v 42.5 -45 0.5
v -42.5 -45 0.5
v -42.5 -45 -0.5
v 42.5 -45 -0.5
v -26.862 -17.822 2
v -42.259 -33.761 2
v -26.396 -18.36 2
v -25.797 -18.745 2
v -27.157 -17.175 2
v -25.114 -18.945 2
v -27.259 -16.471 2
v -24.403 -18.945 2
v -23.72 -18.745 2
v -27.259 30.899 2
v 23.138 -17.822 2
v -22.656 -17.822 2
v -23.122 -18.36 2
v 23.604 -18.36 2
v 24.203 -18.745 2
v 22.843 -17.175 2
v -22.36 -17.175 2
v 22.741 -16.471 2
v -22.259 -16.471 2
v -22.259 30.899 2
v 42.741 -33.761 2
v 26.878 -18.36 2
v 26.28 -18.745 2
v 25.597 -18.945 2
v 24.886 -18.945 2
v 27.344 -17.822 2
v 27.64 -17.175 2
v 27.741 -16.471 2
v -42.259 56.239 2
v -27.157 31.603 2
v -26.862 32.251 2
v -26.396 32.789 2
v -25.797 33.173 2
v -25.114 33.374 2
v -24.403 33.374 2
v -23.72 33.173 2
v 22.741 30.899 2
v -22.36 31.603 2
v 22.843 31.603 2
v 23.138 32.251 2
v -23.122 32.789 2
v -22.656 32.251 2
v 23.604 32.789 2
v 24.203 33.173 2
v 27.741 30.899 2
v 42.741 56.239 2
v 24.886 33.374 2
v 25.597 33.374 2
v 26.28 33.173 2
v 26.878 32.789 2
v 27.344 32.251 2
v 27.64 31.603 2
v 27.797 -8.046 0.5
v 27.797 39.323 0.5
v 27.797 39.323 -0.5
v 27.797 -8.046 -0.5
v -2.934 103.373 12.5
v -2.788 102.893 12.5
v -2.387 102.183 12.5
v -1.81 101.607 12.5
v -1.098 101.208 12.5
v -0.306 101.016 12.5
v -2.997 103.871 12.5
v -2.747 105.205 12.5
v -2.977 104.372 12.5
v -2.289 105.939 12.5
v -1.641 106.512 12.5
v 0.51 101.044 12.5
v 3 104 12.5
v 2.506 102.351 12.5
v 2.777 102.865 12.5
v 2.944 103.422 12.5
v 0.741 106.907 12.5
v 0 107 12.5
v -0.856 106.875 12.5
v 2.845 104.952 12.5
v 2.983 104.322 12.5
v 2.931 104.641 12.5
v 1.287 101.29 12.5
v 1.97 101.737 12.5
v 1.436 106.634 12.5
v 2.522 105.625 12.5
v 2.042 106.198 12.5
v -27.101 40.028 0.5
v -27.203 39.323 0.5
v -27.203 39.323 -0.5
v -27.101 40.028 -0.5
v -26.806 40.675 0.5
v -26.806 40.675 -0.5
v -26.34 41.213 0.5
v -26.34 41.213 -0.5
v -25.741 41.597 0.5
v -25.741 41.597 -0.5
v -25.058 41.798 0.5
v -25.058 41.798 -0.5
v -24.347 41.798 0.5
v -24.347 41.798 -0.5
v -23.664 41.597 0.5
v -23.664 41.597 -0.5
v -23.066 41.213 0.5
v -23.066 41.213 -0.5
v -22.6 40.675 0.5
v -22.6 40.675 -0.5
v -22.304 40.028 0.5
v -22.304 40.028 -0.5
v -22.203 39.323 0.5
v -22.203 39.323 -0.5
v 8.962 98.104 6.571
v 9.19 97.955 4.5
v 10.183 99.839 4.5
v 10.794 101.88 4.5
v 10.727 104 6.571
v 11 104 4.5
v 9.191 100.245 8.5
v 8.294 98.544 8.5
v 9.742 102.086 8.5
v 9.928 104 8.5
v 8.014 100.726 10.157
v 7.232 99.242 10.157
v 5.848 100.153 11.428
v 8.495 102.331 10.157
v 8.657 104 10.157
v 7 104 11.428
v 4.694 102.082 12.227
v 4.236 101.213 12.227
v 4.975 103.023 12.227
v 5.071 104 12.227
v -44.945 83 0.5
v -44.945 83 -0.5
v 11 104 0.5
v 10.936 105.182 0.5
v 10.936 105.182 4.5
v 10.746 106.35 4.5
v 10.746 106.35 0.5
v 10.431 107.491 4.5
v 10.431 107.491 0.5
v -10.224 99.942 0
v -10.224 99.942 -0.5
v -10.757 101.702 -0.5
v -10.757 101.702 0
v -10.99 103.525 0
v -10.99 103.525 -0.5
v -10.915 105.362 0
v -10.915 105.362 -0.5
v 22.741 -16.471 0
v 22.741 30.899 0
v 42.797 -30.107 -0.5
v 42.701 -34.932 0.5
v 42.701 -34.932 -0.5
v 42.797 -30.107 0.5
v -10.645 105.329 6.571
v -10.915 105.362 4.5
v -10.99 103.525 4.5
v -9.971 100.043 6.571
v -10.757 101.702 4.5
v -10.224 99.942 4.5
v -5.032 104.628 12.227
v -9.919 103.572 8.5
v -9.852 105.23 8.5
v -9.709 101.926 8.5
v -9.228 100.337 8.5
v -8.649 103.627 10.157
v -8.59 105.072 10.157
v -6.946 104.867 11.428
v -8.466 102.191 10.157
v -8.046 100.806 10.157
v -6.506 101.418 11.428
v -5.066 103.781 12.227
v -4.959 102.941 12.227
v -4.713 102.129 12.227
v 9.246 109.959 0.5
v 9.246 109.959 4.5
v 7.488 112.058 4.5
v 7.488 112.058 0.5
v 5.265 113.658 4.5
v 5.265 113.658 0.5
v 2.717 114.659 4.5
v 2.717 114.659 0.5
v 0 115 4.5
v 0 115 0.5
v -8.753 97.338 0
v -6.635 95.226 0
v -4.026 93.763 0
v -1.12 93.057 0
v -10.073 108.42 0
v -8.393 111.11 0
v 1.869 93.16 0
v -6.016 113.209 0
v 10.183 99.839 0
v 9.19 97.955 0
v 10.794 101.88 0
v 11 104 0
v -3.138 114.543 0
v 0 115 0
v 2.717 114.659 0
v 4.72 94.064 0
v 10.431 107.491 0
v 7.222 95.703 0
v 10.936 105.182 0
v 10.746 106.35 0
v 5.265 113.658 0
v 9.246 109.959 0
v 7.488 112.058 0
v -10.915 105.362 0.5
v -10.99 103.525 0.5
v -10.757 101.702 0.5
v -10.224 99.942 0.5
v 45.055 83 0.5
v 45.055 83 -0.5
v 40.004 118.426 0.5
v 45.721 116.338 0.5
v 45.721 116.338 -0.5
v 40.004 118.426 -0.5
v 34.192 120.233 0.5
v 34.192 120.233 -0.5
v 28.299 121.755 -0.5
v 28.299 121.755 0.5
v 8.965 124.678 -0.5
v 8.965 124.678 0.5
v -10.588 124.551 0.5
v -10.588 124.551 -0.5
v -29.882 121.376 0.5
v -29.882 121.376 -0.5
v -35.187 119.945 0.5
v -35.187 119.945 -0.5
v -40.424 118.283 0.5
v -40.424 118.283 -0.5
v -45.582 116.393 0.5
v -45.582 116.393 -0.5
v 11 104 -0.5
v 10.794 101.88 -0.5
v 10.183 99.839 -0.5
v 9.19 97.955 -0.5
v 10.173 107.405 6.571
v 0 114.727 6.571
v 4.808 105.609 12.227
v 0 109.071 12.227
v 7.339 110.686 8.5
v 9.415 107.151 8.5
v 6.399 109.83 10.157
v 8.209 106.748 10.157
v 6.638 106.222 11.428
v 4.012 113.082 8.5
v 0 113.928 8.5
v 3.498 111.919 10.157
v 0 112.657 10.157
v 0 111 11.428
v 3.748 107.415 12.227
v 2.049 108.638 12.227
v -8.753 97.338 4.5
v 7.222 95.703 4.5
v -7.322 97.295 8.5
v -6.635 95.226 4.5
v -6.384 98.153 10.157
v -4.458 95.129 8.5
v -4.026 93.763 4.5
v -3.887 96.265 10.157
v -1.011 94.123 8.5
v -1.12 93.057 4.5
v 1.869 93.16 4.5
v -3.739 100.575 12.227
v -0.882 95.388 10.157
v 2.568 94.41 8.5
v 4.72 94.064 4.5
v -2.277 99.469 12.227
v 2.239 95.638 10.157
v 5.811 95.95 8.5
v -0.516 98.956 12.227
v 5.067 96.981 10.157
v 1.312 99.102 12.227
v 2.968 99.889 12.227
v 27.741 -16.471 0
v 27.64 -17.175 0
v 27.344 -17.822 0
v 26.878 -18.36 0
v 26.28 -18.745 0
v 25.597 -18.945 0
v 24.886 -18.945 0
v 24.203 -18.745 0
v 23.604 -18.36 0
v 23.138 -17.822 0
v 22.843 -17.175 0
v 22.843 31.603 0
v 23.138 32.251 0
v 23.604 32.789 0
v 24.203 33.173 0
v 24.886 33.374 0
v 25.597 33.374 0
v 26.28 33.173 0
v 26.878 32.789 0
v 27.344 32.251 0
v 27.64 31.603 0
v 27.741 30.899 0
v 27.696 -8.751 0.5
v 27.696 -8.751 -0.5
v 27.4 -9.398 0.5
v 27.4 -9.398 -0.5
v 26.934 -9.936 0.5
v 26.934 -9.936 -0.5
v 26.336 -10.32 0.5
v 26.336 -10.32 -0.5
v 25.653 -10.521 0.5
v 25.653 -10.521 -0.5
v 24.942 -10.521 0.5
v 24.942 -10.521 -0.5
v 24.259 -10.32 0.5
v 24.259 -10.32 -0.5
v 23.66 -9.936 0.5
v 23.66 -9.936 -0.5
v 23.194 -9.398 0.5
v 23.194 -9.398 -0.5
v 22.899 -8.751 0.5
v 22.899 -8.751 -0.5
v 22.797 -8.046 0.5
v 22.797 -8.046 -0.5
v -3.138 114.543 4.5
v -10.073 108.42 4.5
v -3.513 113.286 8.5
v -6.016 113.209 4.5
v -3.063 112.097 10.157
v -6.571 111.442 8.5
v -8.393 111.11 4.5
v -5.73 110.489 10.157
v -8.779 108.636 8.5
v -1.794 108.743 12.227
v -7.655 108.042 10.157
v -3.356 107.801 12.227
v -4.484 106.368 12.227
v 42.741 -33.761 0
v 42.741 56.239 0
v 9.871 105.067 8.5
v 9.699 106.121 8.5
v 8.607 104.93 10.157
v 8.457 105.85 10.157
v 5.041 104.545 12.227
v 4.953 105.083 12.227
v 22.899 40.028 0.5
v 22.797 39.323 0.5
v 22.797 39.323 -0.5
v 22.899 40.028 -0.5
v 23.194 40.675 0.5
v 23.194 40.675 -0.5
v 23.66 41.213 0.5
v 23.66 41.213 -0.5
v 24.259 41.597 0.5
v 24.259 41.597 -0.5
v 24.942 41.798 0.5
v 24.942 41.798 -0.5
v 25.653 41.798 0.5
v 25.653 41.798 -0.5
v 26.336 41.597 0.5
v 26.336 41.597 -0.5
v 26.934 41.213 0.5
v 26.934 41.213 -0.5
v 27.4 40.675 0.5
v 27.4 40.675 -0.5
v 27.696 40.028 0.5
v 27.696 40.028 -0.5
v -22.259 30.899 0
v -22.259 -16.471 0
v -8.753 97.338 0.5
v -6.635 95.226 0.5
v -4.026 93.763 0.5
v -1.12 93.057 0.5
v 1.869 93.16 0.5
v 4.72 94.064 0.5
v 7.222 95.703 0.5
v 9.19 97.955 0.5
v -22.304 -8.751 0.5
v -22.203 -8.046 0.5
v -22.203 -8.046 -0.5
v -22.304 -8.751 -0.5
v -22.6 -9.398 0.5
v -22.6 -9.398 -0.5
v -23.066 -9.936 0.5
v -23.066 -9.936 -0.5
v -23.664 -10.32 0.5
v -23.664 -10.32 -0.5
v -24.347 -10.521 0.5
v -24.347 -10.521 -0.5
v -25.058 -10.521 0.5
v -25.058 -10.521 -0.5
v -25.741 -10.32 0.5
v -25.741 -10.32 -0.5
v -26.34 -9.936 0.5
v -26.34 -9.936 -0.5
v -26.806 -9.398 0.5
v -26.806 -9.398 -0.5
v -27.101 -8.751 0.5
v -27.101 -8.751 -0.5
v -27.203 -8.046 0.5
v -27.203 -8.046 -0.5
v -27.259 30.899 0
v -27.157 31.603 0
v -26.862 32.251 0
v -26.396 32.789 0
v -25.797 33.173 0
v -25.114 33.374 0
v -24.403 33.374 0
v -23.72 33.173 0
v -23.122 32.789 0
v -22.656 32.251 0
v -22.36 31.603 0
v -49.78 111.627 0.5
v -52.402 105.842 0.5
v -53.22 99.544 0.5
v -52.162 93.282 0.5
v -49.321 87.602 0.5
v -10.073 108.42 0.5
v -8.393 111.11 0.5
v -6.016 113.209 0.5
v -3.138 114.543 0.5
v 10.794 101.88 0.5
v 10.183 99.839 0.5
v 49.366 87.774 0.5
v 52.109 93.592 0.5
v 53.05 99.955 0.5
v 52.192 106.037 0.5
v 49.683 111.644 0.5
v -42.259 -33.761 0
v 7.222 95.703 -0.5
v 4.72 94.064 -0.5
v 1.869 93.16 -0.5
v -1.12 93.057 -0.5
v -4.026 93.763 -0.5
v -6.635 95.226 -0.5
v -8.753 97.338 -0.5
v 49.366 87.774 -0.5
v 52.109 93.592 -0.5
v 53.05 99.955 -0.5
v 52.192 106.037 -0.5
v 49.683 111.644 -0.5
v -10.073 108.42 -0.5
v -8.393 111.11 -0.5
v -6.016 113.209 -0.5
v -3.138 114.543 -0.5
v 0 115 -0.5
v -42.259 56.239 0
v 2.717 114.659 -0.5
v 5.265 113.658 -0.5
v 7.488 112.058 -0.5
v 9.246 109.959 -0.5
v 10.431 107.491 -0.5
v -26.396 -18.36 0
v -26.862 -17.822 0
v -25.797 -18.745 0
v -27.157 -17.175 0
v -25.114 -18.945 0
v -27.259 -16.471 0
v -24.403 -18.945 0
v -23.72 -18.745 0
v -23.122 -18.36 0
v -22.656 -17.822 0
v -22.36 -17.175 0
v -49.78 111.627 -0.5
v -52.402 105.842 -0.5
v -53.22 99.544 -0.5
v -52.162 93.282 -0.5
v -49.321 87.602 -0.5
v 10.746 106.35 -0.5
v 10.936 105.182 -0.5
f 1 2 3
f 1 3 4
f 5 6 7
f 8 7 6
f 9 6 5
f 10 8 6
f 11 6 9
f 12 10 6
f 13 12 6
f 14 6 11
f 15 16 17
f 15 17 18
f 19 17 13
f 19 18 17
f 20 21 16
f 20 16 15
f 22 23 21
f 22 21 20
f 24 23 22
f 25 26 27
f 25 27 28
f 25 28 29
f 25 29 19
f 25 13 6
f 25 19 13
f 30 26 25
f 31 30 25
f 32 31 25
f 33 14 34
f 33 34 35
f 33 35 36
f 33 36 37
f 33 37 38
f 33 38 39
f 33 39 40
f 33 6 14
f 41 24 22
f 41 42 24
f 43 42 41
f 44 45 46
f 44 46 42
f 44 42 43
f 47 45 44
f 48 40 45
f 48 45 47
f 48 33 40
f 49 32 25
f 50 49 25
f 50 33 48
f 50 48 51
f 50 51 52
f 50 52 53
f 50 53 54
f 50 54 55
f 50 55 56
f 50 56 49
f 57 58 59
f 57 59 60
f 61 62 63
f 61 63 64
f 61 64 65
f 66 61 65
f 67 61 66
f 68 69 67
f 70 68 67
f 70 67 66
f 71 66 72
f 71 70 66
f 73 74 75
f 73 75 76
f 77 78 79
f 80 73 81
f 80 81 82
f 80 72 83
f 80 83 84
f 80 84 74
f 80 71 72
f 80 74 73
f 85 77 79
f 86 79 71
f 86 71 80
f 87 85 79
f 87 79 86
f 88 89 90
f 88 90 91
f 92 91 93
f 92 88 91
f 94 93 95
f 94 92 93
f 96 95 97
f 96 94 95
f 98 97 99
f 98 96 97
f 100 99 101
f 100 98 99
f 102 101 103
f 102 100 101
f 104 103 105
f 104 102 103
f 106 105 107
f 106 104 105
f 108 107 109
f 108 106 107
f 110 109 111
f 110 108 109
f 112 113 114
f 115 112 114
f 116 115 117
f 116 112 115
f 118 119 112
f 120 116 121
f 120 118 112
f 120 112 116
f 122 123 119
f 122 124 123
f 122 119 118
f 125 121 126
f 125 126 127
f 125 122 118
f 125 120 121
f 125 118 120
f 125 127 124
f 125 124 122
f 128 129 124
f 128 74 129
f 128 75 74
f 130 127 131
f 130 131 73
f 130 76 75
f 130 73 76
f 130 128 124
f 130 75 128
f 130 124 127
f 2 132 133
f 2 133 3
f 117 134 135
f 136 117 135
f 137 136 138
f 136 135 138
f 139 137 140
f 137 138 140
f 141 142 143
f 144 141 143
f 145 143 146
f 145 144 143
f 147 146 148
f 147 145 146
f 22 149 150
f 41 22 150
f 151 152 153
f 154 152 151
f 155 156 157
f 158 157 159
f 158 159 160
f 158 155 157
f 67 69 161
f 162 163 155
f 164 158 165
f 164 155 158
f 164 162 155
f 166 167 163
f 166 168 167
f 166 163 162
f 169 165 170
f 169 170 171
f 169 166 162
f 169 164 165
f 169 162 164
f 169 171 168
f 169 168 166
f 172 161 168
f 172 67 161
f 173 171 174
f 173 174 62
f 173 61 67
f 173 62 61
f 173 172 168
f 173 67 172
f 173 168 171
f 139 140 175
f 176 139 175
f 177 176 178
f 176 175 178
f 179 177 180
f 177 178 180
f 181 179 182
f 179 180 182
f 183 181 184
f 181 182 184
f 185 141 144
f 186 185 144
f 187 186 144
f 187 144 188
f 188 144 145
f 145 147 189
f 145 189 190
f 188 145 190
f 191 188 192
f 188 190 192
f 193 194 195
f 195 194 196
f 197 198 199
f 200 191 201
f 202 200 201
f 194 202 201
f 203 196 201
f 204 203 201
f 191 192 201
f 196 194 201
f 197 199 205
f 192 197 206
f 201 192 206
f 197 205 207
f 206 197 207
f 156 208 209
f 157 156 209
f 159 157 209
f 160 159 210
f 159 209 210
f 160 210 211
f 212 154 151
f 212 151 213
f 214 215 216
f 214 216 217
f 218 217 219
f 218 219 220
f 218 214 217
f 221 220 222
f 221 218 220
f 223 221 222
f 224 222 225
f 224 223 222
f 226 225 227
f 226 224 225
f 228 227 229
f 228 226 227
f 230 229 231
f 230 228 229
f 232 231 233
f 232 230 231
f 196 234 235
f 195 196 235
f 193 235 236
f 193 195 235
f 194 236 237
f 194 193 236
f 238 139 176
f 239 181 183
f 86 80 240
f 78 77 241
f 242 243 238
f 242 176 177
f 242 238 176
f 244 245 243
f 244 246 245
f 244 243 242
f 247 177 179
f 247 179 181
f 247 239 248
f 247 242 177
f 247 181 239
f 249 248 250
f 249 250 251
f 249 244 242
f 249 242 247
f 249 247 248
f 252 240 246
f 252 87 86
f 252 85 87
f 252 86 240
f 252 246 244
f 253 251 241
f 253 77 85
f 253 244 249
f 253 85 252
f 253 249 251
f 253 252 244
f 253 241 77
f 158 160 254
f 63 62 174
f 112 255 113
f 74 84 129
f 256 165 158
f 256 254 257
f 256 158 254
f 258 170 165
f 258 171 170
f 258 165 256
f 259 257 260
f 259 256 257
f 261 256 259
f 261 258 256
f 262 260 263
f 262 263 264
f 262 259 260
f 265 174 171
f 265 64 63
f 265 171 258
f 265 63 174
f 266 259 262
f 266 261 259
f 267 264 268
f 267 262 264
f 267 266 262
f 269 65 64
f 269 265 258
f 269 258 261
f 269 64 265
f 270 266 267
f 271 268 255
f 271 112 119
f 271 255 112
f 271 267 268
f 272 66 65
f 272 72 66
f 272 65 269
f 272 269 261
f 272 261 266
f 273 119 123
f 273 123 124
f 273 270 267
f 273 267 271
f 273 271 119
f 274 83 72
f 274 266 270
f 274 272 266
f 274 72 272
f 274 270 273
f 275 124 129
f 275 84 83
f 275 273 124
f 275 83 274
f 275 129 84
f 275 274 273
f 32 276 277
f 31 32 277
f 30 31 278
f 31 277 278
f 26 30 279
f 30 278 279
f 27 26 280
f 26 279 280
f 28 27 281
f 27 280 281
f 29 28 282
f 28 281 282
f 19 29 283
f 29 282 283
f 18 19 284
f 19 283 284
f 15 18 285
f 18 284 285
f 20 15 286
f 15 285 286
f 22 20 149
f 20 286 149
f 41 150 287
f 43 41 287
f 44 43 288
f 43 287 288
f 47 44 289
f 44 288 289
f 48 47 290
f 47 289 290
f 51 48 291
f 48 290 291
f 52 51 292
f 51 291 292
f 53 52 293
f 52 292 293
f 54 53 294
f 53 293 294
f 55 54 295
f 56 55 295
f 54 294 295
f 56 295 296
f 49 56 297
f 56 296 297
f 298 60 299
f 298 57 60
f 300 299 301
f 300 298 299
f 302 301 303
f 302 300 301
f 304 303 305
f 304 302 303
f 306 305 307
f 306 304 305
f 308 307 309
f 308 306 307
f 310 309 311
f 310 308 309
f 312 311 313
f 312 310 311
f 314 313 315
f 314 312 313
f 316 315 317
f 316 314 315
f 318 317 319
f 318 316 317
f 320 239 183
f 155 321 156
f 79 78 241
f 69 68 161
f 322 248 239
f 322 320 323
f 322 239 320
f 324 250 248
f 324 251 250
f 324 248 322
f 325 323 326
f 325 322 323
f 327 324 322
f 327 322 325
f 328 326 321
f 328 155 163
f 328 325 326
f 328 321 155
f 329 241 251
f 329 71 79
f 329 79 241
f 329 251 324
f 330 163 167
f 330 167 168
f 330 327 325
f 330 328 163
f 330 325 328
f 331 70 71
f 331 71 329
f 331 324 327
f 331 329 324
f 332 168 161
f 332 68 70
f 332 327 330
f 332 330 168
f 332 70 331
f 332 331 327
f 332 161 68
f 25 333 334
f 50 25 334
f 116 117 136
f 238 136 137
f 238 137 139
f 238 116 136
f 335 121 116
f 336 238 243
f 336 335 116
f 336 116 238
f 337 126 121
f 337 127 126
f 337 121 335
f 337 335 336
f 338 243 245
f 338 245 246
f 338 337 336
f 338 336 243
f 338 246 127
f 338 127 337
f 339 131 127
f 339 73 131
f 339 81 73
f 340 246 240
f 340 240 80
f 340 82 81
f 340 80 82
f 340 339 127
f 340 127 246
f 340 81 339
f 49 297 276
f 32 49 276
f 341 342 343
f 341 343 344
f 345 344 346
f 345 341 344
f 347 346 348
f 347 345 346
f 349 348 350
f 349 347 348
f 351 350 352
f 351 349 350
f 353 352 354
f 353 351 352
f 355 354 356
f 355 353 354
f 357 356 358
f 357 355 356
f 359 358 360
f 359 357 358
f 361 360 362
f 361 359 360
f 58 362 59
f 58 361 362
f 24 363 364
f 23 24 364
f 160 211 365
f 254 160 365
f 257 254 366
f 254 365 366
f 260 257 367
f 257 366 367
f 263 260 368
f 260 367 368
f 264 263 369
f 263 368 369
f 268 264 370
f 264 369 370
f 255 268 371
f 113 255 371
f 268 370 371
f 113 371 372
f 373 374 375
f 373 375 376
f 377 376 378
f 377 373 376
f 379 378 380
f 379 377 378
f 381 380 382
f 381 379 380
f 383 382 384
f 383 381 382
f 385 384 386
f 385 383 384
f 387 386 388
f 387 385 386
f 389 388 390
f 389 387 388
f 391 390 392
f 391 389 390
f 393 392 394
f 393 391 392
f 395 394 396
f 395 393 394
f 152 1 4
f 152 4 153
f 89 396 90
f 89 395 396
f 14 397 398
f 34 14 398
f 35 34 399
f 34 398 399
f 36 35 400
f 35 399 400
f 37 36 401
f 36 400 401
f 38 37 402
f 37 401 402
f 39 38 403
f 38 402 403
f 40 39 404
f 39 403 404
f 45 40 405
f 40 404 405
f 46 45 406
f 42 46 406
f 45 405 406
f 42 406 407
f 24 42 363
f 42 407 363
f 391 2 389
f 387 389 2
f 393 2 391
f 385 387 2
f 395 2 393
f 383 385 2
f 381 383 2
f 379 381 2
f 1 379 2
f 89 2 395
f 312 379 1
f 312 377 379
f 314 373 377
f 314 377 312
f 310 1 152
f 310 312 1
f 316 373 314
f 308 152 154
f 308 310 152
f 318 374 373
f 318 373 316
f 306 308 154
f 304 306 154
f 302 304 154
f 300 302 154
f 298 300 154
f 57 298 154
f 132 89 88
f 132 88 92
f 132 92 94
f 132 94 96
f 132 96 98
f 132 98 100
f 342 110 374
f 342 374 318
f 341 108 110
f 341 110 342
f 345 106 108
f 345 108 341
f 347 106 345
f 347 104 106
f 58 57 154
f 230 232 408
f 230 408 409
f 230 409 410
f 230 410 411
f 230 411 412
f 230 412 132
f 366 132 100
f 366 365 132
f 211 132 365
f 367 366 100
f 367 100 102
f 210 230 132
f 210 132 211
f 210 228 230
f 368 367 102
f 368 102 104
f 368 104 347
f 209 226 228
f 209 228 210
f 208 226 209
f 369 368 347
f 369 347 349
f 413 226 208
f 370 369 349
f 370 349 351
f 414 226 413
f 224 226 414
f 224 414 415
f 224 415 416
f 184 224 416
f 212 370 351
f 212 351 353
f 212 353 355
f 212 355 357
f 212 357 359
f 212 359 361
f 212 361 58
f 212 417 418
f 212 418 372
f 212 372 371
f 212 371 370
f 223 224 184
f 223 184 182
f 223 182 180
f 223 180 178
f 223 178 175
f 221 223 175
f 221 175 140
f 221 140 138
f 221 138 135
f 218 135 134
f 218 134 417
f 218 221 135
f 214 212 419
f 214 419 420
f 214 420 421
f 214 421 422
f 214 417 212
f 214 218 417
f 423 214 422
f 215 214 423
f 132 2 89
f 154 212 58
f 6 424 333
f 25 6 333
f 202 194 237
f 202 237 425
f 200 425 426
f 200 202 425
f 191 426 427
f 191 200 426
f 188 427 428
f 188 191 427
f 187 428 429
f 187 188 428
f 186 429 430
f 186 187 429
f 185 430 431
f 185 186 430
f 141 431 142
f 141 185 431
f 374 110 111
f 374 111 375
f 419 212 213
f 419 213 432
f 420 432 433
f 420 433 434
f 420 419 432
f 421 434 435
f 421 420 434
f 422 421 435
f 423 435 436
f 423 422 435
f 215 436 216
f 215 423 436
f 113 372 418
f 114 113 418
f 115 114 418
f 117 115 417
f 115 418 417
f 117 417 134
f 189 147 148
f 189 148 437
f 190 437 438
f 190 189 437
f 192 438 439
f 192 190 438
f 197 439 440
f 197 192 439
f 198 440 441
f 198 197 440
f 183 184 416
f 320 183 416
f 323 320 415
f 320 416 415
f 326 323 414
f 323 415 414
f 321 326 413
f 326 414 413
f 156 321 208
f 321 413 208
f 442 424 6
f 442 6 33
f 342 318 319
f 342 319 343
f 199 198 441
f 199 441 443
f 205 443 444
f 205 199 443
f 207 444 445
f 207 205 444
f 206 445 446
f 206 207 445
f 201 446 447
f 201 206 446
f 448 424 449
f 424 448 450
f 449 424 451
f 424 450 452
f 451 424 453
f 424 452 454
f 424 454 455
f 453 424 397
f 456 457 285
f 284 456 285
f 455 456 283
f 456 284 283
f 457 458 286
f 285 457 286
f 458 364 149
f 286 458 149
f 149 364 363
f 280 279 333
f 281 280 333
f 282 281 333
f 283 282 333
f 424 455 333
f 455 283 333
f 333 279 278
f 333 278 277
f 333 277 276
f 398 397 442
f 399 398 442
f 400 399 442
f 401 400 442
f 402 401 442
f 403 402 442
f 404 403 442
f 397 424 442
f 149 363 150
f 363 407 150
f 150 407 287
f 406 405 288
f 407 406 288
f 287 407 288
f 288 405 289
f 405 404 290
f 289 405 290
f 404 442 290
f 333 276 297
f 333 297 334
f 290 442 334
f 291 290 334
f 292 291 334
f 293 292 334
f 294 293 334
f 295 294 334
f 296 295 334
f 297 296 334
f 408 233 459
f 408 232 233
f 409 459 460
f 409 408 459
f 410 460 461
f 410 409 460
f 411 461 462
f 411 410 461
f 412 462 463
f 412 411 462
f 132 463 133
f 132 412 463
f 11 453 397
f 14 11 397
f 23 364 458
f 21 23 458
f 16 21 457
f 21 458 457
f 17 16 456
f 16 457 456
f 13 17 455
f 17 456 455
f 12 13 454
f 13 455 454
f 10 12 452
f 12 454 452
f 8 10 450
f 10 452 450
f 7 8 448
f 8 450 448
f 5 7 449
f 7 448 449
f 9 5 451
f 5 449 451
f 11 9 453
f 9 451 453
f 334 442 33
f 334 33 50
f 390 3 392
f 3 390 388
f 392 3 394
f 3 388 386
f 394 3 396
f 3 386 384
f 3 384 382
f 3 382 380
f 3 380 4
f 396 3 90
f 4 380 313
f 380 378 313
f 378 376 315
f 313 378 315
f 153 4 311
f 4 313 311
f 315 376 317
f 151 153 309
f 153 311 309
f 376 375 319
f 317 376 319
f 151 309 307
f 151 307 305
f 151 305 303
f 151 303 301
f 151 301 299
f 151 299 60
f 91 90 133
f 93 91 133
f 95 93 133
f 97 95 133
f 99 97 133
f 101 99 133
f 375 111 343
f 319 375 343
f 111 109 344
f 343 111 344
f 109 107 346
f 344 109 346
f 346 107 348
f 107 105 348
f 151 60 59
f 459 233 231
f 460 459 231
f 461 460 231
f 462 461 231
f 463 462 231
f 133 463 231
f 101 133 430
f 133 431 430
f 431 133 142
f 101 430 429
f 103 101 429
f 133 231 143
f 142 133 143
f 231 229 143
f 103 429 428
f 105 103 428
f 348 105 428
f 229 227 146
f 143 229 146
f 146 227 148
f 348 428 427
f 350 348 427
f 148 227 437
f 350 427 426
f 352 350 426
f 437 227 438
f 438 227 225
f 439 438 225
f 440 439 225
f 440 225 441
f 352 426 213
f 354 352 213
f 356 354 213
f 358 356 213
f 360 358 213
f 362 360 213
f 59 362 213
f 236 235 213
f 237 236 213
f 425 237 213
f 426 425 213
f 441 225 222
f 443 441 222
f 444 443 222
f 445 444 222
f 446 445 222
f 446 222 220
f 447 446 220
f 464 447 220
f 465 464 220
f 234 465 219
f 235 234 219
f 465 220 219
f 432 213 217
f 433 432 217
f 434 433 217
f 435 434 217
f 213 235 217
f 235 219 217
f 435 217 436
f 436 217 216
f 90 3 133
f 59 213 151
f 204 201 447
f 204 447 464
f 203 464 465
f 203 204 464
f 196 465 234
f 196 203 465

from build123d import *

# Parameters (mm, degrees)
F1_DEPTH = 12.5
F2_R     = 8
F3_W     = 85
F3_H     = 90
F4_DEPTH = 2
F5_DEPTH = 0.5


with BuildPart() as f1:
    # F0 (on Top) → F1 (new body)
    with BuildSketch(Plane.XY):
        with BuildLine():
            ThreePointArc((9.1898767867, 97.9546576073), (9.2825168111, 102.7916529277), (10.4312872179, 107.4911669936))
            ThreePointArc((10.4312872179, 107.4911669936), (6.4263972438, 112.9275650916), (0, 115))
            ThreePointArc((0, 115), (-7.2805617511, 112.2458123061), (-10.9152992151, 105.3624401069))
            ThreePointArc((-10.9152992151, 105.3624401069), (-10.3976417078, 102.6806649391), (-10.2241559556, 99.9549008188))
            ThreePointArc((-10.2241559556, 99.9549008188), (-10.2241569084, 99.9485001223), (-10.2241597667, 99.9420994264))
            ThreePointArc((-10.2241597667, 99.9420994264), (-1.1202305864, 93.0571903319), (9.1898767867, 97.9546576073))
        make_face()
        with BuildLine():
            ThreePointArc((11, 104), (10.8568908855, 105.768592746), (10.4312872179, 107.4911669936))
            ThreePointArc((10.4312872179, 107.4911669936), (9.2825168111, 102.7916529277), (9.1898767867, 97.9546576073))
            ThreePointArc((9.1898767867, 97.9546576073), (10.5377569875, 100.8447380976), (11, 104))
        make_face()
        with BuildLine():
            ThreePointArc((-10.2241559556, 99.9549008188), (-10.3976417078, 102.6806649391), (-10.9152992151, 105.3624401069))
            ThreePointArc((-10.9152992151, 105.3624401069), (-10.9116545392, 102.6086714205), (-10.2241597667, 99.9420994264))
            ThreePointArc((-10.2241597667, 99.9420994264), (-10.2241569084, 99.9485001223), (-10.2241559556, 99.9549008188))
        make_face()
    extrude(amount=F1_DEPTH)

    # F2
    f2_edges = [f1.edges().sort_by_distance(p)[0] for p in [
        (10.915299, 102.63756, 12.5),
    ]]
    fillet(f2_edges, radius=F2_R)

    # F0 (on Top) → F5 (join, symmetric)
    with BuildSketch(Plane.XY):
        with BuildLine():
            Line((45.0553547106, 83), (45.720910672, 116.3382926096))
            ThreePointArc((45.720910672, 116.3382926096), (37.1086608449, 119.3647656987), (28.2985051586, 121.7546492163))
            ThreePointArc((28.2985051586, 121.7546492163), (17.3640362052, 117.1292947522), (10.4312872179, 107.4911669936))
            ThreePointArc((10.4312872179, 107.4911669936), (10.8568908855, 105.768592746), (11, 104))
            ThreePointArc((11, 104), (10.5377569875, 100.8447380976), (9.1898767867, 97.9546576073))
            ThreePointArc((9.1898767867, 97.9546576073), (11.6452400122, 89.6864424383), (17.093512965, 83))
            Line((17.093512965, 83), (45.0553547106, 83))
        make_face()
        with BuildLine():
            ThreePointArc((53.0502116449, 99.9549008188), (51.1343756472, 108.9289492269), (45.720910672, 116.3382926096))
            Line((45.720910672, 116.3382926096), (45.0553547106, 83))
            ThreePointArc((45.0553547106, 83), (50.9512598026, 90.5822491239), (53.0502116449, 99.9549008188))
        make_face()
        with BuildLine():
            ThreePointArc((-29.8816593085, 121.3758066378), (-37.8142067265, 119.1431314413), (-45.5824041707, 116.3926304799))
            Line((-45.5824041707, 116.3926304799), (-44.9446452894, 83))
            Line((-44.9446452894, 83), (-18.5036666218, 83))
            ThreePointArc((-18.5036666218, 83), (-12.4074090251, 90.514917343), (-10.2241597667, 99.9420994264))
            ThreePointArc((-10.2241597667, 99.9420994264), (-10.9116545392, 102.6086714205), (-10.9152992151, 105.3624401069))
            ThreePointArc((-10.9152992151, 105.3624401069), (-17.8541188437, 116.3826843124), (-29.8816593085, 121.3758066378))
        make_face()
        with BuildLine():
            Line((-44.9446452894, 83), (-45.5824041707, 116.3926304799))
            ThreePointArc((-45.5824041707, 116.3926304799), (-53.2202358169, 99.5443516753), (-44.9446452894, 83))
        make_face()
        with BuildLine():
            ThreePointArc((10.4312872179, 107.4911669936), (17.3640362052, 117.1292947522), (28.2985051586, 121.7546492163))
            ThreePointArc((28.2985051586, 121.7546492163), (-0.8139254821, 124.9973500732), (-29.8816593085, 121.3758066378))
            ThreePointArc((-29.8816593085, 121.3758066378), (-17.8541188437, 116.3826843124), (-10.9152992151, 105.3624401069))
            ThreePointArc((-10.9152992151, 105.3624401069), (-7.2805617511, 112.2458123061), (0, 115))
            ThreePointArc((0, 115), (6.4263972438, 112.9275650916), (10.4312872179, 107.4911669936))
        make_face()
        with BuildLine():
            ThreePointArc((17.093512965, 83), (31.0744338378, 77.9791230117), (45.0553547106, 83))
            Line((45.0553547106, 83), (17.093512965, 83))
        make_face()
        with BuildLine():
            Line((42.797318697, -30.1070408914), (45.0553547106, 83))
            ThreePointArc((45.0553547106, 83), (31.0744338378, 77.9791230117), (17.093512965, 83))
            Line((17.093512965, 83), (-18.5036666218, 83))
            ThreePointArc((-18.5036666218, 83), (-31.7241559556, 78.4549008188), (-44.9446452894, 83))
            Line((-44.9446452894, 83), (-42.5, -45))
            Line((-42.5, -45), (42.5, -45))
            Line((42.5, -45), (42.7009939726, -34.9320323765))
            Line((42.7009939726, -34.9320323765), (-42.202681303, -34.9320323765))
            Line((-42.202681303, -34.9320323765), (-42.202681303, 55.0679676235))
            Line((-42.202681303, 55.0679676235), (42.797318697, 55.0679676235))
            Line((42.797318697, 55.0679676235), (42.797318697, -30.1070408914))
        make_face()
        with BuildLine():
            Line((-18.5036666218, 83), (-44.9446452894, 83))
            ThreePointArc((-44.9446452894, 83), (-31.7241559556, 78.4549008188), (-18.5036666218, 83))
        make_face()
        Polygon((42.7009939726, -34.9320323765), (42.797318697, -30.1070408914), (42.797318697, 55.0679676235), (-42.202681303, 55.0679676235), (-42.202681303, -34.9320323765), align=None)
        with BuildLine():
            ThreePointArc((-27.202681303, 39.3233826756), (-24.702681303, 41.8233826756), (-22.202681303, 39.3233826756))
            Line((-22.202681303, 39.3233826756), (-22.202681303, -8.0463153869))
            ThreePointArc((-22.202681303, -8.0463153869), (-24.702681303, -10.5463153869), (-27.202681303, -8.0463153869))
            Line((-27.202681303, -8.0463153869), (-27.202681303, 39.3233826756))
        make_face(mode=Mode.SUBTRACT)
        with BuildLine():
            Line((22.797318697, -8.0463153869), (22.797318697, 39.3233826756))
            ThreePointArc((22.797318697, 39.3233826756), (25.297318697, 41.8233826756), (27.797318697, 39.3233826756))
            Line((27.797318697, 39.3233826756), (27.797318697, -8.0463153869))
            ThreePointArc((27.797318697, -8.0463153869), (25.297318697, -10.5463153869), (22.797318697, -8.0463153869))
        make_face(mode=Mode.SUBTRACT)
        with BuildLine():
            Line((-18.5036666218, 83), (17.093512965, 83))
            ThreePointArc((17.093512965, 83), (11.6452400122, 89.6864424383), (9.1898767867, 97.9546576073))
            ThreePointArc((9.1898767867, 97.9546576073), (-1.1202305864, 93.0571903319), (-10.2241597667, 99.9420994264))
            ThreePointArc((-10.2241597667, 99.9420994264), (-12.4074090251, 90.514917343), (-18.5036666218, 83))
        make_face()
    extrude(amount=F5_DEPTH, both=True)


with BuildPart() as f4:
    # F3 (on face) → F4 (new body)
    with BuildSketch(Plane.XY):
        with Locations((0.2413462102, 11.2389419973)):
            Rectangle(F3_W, F3_H)
        with BuildLine():
            ThreePointArc((-27.2586537898, 30.8991409838), (-24.7586537898, 33.3991409838), (-22.2586537898, 30.8991409838))
            Line((-22.2586537898, 30.8991409838), (-22.2586537898, -16.4705570787))
            ThreePointArc((-22.2586537898, -16.4705570787), (-24.7586537898, -18.9705570787), (-27.2586537898, -16.4705570787))
            Line((-27.2586537898, -16.4705570787), (-27.2586537898, 30.8991409838))
        make_face(mode=Mode.SUBTRACT)
        with BuildLine():
            Line((22.7413462102, -16.4705570787), (22.7413462102, 30.8991409838))
            ThreePointArc((22.7413462102, 30.8991409838), (25.2413462102, 33.3991409838), (27.7413462102, 30.8991409838))
            Line((27.7413462102, 30.8991409838), (27.7413462102, -16.4705570787))
            ThreePointArc((27.7413462102, -16.4705570787), (25.2413462102, -18.9705570787), (22.7413462102, -16.4705570787))
        make_face(mode=Mode.SUBTRACT)
    extrude(amount=F4_DEPTH)


solid = Compound([f1.part, f4.part])
